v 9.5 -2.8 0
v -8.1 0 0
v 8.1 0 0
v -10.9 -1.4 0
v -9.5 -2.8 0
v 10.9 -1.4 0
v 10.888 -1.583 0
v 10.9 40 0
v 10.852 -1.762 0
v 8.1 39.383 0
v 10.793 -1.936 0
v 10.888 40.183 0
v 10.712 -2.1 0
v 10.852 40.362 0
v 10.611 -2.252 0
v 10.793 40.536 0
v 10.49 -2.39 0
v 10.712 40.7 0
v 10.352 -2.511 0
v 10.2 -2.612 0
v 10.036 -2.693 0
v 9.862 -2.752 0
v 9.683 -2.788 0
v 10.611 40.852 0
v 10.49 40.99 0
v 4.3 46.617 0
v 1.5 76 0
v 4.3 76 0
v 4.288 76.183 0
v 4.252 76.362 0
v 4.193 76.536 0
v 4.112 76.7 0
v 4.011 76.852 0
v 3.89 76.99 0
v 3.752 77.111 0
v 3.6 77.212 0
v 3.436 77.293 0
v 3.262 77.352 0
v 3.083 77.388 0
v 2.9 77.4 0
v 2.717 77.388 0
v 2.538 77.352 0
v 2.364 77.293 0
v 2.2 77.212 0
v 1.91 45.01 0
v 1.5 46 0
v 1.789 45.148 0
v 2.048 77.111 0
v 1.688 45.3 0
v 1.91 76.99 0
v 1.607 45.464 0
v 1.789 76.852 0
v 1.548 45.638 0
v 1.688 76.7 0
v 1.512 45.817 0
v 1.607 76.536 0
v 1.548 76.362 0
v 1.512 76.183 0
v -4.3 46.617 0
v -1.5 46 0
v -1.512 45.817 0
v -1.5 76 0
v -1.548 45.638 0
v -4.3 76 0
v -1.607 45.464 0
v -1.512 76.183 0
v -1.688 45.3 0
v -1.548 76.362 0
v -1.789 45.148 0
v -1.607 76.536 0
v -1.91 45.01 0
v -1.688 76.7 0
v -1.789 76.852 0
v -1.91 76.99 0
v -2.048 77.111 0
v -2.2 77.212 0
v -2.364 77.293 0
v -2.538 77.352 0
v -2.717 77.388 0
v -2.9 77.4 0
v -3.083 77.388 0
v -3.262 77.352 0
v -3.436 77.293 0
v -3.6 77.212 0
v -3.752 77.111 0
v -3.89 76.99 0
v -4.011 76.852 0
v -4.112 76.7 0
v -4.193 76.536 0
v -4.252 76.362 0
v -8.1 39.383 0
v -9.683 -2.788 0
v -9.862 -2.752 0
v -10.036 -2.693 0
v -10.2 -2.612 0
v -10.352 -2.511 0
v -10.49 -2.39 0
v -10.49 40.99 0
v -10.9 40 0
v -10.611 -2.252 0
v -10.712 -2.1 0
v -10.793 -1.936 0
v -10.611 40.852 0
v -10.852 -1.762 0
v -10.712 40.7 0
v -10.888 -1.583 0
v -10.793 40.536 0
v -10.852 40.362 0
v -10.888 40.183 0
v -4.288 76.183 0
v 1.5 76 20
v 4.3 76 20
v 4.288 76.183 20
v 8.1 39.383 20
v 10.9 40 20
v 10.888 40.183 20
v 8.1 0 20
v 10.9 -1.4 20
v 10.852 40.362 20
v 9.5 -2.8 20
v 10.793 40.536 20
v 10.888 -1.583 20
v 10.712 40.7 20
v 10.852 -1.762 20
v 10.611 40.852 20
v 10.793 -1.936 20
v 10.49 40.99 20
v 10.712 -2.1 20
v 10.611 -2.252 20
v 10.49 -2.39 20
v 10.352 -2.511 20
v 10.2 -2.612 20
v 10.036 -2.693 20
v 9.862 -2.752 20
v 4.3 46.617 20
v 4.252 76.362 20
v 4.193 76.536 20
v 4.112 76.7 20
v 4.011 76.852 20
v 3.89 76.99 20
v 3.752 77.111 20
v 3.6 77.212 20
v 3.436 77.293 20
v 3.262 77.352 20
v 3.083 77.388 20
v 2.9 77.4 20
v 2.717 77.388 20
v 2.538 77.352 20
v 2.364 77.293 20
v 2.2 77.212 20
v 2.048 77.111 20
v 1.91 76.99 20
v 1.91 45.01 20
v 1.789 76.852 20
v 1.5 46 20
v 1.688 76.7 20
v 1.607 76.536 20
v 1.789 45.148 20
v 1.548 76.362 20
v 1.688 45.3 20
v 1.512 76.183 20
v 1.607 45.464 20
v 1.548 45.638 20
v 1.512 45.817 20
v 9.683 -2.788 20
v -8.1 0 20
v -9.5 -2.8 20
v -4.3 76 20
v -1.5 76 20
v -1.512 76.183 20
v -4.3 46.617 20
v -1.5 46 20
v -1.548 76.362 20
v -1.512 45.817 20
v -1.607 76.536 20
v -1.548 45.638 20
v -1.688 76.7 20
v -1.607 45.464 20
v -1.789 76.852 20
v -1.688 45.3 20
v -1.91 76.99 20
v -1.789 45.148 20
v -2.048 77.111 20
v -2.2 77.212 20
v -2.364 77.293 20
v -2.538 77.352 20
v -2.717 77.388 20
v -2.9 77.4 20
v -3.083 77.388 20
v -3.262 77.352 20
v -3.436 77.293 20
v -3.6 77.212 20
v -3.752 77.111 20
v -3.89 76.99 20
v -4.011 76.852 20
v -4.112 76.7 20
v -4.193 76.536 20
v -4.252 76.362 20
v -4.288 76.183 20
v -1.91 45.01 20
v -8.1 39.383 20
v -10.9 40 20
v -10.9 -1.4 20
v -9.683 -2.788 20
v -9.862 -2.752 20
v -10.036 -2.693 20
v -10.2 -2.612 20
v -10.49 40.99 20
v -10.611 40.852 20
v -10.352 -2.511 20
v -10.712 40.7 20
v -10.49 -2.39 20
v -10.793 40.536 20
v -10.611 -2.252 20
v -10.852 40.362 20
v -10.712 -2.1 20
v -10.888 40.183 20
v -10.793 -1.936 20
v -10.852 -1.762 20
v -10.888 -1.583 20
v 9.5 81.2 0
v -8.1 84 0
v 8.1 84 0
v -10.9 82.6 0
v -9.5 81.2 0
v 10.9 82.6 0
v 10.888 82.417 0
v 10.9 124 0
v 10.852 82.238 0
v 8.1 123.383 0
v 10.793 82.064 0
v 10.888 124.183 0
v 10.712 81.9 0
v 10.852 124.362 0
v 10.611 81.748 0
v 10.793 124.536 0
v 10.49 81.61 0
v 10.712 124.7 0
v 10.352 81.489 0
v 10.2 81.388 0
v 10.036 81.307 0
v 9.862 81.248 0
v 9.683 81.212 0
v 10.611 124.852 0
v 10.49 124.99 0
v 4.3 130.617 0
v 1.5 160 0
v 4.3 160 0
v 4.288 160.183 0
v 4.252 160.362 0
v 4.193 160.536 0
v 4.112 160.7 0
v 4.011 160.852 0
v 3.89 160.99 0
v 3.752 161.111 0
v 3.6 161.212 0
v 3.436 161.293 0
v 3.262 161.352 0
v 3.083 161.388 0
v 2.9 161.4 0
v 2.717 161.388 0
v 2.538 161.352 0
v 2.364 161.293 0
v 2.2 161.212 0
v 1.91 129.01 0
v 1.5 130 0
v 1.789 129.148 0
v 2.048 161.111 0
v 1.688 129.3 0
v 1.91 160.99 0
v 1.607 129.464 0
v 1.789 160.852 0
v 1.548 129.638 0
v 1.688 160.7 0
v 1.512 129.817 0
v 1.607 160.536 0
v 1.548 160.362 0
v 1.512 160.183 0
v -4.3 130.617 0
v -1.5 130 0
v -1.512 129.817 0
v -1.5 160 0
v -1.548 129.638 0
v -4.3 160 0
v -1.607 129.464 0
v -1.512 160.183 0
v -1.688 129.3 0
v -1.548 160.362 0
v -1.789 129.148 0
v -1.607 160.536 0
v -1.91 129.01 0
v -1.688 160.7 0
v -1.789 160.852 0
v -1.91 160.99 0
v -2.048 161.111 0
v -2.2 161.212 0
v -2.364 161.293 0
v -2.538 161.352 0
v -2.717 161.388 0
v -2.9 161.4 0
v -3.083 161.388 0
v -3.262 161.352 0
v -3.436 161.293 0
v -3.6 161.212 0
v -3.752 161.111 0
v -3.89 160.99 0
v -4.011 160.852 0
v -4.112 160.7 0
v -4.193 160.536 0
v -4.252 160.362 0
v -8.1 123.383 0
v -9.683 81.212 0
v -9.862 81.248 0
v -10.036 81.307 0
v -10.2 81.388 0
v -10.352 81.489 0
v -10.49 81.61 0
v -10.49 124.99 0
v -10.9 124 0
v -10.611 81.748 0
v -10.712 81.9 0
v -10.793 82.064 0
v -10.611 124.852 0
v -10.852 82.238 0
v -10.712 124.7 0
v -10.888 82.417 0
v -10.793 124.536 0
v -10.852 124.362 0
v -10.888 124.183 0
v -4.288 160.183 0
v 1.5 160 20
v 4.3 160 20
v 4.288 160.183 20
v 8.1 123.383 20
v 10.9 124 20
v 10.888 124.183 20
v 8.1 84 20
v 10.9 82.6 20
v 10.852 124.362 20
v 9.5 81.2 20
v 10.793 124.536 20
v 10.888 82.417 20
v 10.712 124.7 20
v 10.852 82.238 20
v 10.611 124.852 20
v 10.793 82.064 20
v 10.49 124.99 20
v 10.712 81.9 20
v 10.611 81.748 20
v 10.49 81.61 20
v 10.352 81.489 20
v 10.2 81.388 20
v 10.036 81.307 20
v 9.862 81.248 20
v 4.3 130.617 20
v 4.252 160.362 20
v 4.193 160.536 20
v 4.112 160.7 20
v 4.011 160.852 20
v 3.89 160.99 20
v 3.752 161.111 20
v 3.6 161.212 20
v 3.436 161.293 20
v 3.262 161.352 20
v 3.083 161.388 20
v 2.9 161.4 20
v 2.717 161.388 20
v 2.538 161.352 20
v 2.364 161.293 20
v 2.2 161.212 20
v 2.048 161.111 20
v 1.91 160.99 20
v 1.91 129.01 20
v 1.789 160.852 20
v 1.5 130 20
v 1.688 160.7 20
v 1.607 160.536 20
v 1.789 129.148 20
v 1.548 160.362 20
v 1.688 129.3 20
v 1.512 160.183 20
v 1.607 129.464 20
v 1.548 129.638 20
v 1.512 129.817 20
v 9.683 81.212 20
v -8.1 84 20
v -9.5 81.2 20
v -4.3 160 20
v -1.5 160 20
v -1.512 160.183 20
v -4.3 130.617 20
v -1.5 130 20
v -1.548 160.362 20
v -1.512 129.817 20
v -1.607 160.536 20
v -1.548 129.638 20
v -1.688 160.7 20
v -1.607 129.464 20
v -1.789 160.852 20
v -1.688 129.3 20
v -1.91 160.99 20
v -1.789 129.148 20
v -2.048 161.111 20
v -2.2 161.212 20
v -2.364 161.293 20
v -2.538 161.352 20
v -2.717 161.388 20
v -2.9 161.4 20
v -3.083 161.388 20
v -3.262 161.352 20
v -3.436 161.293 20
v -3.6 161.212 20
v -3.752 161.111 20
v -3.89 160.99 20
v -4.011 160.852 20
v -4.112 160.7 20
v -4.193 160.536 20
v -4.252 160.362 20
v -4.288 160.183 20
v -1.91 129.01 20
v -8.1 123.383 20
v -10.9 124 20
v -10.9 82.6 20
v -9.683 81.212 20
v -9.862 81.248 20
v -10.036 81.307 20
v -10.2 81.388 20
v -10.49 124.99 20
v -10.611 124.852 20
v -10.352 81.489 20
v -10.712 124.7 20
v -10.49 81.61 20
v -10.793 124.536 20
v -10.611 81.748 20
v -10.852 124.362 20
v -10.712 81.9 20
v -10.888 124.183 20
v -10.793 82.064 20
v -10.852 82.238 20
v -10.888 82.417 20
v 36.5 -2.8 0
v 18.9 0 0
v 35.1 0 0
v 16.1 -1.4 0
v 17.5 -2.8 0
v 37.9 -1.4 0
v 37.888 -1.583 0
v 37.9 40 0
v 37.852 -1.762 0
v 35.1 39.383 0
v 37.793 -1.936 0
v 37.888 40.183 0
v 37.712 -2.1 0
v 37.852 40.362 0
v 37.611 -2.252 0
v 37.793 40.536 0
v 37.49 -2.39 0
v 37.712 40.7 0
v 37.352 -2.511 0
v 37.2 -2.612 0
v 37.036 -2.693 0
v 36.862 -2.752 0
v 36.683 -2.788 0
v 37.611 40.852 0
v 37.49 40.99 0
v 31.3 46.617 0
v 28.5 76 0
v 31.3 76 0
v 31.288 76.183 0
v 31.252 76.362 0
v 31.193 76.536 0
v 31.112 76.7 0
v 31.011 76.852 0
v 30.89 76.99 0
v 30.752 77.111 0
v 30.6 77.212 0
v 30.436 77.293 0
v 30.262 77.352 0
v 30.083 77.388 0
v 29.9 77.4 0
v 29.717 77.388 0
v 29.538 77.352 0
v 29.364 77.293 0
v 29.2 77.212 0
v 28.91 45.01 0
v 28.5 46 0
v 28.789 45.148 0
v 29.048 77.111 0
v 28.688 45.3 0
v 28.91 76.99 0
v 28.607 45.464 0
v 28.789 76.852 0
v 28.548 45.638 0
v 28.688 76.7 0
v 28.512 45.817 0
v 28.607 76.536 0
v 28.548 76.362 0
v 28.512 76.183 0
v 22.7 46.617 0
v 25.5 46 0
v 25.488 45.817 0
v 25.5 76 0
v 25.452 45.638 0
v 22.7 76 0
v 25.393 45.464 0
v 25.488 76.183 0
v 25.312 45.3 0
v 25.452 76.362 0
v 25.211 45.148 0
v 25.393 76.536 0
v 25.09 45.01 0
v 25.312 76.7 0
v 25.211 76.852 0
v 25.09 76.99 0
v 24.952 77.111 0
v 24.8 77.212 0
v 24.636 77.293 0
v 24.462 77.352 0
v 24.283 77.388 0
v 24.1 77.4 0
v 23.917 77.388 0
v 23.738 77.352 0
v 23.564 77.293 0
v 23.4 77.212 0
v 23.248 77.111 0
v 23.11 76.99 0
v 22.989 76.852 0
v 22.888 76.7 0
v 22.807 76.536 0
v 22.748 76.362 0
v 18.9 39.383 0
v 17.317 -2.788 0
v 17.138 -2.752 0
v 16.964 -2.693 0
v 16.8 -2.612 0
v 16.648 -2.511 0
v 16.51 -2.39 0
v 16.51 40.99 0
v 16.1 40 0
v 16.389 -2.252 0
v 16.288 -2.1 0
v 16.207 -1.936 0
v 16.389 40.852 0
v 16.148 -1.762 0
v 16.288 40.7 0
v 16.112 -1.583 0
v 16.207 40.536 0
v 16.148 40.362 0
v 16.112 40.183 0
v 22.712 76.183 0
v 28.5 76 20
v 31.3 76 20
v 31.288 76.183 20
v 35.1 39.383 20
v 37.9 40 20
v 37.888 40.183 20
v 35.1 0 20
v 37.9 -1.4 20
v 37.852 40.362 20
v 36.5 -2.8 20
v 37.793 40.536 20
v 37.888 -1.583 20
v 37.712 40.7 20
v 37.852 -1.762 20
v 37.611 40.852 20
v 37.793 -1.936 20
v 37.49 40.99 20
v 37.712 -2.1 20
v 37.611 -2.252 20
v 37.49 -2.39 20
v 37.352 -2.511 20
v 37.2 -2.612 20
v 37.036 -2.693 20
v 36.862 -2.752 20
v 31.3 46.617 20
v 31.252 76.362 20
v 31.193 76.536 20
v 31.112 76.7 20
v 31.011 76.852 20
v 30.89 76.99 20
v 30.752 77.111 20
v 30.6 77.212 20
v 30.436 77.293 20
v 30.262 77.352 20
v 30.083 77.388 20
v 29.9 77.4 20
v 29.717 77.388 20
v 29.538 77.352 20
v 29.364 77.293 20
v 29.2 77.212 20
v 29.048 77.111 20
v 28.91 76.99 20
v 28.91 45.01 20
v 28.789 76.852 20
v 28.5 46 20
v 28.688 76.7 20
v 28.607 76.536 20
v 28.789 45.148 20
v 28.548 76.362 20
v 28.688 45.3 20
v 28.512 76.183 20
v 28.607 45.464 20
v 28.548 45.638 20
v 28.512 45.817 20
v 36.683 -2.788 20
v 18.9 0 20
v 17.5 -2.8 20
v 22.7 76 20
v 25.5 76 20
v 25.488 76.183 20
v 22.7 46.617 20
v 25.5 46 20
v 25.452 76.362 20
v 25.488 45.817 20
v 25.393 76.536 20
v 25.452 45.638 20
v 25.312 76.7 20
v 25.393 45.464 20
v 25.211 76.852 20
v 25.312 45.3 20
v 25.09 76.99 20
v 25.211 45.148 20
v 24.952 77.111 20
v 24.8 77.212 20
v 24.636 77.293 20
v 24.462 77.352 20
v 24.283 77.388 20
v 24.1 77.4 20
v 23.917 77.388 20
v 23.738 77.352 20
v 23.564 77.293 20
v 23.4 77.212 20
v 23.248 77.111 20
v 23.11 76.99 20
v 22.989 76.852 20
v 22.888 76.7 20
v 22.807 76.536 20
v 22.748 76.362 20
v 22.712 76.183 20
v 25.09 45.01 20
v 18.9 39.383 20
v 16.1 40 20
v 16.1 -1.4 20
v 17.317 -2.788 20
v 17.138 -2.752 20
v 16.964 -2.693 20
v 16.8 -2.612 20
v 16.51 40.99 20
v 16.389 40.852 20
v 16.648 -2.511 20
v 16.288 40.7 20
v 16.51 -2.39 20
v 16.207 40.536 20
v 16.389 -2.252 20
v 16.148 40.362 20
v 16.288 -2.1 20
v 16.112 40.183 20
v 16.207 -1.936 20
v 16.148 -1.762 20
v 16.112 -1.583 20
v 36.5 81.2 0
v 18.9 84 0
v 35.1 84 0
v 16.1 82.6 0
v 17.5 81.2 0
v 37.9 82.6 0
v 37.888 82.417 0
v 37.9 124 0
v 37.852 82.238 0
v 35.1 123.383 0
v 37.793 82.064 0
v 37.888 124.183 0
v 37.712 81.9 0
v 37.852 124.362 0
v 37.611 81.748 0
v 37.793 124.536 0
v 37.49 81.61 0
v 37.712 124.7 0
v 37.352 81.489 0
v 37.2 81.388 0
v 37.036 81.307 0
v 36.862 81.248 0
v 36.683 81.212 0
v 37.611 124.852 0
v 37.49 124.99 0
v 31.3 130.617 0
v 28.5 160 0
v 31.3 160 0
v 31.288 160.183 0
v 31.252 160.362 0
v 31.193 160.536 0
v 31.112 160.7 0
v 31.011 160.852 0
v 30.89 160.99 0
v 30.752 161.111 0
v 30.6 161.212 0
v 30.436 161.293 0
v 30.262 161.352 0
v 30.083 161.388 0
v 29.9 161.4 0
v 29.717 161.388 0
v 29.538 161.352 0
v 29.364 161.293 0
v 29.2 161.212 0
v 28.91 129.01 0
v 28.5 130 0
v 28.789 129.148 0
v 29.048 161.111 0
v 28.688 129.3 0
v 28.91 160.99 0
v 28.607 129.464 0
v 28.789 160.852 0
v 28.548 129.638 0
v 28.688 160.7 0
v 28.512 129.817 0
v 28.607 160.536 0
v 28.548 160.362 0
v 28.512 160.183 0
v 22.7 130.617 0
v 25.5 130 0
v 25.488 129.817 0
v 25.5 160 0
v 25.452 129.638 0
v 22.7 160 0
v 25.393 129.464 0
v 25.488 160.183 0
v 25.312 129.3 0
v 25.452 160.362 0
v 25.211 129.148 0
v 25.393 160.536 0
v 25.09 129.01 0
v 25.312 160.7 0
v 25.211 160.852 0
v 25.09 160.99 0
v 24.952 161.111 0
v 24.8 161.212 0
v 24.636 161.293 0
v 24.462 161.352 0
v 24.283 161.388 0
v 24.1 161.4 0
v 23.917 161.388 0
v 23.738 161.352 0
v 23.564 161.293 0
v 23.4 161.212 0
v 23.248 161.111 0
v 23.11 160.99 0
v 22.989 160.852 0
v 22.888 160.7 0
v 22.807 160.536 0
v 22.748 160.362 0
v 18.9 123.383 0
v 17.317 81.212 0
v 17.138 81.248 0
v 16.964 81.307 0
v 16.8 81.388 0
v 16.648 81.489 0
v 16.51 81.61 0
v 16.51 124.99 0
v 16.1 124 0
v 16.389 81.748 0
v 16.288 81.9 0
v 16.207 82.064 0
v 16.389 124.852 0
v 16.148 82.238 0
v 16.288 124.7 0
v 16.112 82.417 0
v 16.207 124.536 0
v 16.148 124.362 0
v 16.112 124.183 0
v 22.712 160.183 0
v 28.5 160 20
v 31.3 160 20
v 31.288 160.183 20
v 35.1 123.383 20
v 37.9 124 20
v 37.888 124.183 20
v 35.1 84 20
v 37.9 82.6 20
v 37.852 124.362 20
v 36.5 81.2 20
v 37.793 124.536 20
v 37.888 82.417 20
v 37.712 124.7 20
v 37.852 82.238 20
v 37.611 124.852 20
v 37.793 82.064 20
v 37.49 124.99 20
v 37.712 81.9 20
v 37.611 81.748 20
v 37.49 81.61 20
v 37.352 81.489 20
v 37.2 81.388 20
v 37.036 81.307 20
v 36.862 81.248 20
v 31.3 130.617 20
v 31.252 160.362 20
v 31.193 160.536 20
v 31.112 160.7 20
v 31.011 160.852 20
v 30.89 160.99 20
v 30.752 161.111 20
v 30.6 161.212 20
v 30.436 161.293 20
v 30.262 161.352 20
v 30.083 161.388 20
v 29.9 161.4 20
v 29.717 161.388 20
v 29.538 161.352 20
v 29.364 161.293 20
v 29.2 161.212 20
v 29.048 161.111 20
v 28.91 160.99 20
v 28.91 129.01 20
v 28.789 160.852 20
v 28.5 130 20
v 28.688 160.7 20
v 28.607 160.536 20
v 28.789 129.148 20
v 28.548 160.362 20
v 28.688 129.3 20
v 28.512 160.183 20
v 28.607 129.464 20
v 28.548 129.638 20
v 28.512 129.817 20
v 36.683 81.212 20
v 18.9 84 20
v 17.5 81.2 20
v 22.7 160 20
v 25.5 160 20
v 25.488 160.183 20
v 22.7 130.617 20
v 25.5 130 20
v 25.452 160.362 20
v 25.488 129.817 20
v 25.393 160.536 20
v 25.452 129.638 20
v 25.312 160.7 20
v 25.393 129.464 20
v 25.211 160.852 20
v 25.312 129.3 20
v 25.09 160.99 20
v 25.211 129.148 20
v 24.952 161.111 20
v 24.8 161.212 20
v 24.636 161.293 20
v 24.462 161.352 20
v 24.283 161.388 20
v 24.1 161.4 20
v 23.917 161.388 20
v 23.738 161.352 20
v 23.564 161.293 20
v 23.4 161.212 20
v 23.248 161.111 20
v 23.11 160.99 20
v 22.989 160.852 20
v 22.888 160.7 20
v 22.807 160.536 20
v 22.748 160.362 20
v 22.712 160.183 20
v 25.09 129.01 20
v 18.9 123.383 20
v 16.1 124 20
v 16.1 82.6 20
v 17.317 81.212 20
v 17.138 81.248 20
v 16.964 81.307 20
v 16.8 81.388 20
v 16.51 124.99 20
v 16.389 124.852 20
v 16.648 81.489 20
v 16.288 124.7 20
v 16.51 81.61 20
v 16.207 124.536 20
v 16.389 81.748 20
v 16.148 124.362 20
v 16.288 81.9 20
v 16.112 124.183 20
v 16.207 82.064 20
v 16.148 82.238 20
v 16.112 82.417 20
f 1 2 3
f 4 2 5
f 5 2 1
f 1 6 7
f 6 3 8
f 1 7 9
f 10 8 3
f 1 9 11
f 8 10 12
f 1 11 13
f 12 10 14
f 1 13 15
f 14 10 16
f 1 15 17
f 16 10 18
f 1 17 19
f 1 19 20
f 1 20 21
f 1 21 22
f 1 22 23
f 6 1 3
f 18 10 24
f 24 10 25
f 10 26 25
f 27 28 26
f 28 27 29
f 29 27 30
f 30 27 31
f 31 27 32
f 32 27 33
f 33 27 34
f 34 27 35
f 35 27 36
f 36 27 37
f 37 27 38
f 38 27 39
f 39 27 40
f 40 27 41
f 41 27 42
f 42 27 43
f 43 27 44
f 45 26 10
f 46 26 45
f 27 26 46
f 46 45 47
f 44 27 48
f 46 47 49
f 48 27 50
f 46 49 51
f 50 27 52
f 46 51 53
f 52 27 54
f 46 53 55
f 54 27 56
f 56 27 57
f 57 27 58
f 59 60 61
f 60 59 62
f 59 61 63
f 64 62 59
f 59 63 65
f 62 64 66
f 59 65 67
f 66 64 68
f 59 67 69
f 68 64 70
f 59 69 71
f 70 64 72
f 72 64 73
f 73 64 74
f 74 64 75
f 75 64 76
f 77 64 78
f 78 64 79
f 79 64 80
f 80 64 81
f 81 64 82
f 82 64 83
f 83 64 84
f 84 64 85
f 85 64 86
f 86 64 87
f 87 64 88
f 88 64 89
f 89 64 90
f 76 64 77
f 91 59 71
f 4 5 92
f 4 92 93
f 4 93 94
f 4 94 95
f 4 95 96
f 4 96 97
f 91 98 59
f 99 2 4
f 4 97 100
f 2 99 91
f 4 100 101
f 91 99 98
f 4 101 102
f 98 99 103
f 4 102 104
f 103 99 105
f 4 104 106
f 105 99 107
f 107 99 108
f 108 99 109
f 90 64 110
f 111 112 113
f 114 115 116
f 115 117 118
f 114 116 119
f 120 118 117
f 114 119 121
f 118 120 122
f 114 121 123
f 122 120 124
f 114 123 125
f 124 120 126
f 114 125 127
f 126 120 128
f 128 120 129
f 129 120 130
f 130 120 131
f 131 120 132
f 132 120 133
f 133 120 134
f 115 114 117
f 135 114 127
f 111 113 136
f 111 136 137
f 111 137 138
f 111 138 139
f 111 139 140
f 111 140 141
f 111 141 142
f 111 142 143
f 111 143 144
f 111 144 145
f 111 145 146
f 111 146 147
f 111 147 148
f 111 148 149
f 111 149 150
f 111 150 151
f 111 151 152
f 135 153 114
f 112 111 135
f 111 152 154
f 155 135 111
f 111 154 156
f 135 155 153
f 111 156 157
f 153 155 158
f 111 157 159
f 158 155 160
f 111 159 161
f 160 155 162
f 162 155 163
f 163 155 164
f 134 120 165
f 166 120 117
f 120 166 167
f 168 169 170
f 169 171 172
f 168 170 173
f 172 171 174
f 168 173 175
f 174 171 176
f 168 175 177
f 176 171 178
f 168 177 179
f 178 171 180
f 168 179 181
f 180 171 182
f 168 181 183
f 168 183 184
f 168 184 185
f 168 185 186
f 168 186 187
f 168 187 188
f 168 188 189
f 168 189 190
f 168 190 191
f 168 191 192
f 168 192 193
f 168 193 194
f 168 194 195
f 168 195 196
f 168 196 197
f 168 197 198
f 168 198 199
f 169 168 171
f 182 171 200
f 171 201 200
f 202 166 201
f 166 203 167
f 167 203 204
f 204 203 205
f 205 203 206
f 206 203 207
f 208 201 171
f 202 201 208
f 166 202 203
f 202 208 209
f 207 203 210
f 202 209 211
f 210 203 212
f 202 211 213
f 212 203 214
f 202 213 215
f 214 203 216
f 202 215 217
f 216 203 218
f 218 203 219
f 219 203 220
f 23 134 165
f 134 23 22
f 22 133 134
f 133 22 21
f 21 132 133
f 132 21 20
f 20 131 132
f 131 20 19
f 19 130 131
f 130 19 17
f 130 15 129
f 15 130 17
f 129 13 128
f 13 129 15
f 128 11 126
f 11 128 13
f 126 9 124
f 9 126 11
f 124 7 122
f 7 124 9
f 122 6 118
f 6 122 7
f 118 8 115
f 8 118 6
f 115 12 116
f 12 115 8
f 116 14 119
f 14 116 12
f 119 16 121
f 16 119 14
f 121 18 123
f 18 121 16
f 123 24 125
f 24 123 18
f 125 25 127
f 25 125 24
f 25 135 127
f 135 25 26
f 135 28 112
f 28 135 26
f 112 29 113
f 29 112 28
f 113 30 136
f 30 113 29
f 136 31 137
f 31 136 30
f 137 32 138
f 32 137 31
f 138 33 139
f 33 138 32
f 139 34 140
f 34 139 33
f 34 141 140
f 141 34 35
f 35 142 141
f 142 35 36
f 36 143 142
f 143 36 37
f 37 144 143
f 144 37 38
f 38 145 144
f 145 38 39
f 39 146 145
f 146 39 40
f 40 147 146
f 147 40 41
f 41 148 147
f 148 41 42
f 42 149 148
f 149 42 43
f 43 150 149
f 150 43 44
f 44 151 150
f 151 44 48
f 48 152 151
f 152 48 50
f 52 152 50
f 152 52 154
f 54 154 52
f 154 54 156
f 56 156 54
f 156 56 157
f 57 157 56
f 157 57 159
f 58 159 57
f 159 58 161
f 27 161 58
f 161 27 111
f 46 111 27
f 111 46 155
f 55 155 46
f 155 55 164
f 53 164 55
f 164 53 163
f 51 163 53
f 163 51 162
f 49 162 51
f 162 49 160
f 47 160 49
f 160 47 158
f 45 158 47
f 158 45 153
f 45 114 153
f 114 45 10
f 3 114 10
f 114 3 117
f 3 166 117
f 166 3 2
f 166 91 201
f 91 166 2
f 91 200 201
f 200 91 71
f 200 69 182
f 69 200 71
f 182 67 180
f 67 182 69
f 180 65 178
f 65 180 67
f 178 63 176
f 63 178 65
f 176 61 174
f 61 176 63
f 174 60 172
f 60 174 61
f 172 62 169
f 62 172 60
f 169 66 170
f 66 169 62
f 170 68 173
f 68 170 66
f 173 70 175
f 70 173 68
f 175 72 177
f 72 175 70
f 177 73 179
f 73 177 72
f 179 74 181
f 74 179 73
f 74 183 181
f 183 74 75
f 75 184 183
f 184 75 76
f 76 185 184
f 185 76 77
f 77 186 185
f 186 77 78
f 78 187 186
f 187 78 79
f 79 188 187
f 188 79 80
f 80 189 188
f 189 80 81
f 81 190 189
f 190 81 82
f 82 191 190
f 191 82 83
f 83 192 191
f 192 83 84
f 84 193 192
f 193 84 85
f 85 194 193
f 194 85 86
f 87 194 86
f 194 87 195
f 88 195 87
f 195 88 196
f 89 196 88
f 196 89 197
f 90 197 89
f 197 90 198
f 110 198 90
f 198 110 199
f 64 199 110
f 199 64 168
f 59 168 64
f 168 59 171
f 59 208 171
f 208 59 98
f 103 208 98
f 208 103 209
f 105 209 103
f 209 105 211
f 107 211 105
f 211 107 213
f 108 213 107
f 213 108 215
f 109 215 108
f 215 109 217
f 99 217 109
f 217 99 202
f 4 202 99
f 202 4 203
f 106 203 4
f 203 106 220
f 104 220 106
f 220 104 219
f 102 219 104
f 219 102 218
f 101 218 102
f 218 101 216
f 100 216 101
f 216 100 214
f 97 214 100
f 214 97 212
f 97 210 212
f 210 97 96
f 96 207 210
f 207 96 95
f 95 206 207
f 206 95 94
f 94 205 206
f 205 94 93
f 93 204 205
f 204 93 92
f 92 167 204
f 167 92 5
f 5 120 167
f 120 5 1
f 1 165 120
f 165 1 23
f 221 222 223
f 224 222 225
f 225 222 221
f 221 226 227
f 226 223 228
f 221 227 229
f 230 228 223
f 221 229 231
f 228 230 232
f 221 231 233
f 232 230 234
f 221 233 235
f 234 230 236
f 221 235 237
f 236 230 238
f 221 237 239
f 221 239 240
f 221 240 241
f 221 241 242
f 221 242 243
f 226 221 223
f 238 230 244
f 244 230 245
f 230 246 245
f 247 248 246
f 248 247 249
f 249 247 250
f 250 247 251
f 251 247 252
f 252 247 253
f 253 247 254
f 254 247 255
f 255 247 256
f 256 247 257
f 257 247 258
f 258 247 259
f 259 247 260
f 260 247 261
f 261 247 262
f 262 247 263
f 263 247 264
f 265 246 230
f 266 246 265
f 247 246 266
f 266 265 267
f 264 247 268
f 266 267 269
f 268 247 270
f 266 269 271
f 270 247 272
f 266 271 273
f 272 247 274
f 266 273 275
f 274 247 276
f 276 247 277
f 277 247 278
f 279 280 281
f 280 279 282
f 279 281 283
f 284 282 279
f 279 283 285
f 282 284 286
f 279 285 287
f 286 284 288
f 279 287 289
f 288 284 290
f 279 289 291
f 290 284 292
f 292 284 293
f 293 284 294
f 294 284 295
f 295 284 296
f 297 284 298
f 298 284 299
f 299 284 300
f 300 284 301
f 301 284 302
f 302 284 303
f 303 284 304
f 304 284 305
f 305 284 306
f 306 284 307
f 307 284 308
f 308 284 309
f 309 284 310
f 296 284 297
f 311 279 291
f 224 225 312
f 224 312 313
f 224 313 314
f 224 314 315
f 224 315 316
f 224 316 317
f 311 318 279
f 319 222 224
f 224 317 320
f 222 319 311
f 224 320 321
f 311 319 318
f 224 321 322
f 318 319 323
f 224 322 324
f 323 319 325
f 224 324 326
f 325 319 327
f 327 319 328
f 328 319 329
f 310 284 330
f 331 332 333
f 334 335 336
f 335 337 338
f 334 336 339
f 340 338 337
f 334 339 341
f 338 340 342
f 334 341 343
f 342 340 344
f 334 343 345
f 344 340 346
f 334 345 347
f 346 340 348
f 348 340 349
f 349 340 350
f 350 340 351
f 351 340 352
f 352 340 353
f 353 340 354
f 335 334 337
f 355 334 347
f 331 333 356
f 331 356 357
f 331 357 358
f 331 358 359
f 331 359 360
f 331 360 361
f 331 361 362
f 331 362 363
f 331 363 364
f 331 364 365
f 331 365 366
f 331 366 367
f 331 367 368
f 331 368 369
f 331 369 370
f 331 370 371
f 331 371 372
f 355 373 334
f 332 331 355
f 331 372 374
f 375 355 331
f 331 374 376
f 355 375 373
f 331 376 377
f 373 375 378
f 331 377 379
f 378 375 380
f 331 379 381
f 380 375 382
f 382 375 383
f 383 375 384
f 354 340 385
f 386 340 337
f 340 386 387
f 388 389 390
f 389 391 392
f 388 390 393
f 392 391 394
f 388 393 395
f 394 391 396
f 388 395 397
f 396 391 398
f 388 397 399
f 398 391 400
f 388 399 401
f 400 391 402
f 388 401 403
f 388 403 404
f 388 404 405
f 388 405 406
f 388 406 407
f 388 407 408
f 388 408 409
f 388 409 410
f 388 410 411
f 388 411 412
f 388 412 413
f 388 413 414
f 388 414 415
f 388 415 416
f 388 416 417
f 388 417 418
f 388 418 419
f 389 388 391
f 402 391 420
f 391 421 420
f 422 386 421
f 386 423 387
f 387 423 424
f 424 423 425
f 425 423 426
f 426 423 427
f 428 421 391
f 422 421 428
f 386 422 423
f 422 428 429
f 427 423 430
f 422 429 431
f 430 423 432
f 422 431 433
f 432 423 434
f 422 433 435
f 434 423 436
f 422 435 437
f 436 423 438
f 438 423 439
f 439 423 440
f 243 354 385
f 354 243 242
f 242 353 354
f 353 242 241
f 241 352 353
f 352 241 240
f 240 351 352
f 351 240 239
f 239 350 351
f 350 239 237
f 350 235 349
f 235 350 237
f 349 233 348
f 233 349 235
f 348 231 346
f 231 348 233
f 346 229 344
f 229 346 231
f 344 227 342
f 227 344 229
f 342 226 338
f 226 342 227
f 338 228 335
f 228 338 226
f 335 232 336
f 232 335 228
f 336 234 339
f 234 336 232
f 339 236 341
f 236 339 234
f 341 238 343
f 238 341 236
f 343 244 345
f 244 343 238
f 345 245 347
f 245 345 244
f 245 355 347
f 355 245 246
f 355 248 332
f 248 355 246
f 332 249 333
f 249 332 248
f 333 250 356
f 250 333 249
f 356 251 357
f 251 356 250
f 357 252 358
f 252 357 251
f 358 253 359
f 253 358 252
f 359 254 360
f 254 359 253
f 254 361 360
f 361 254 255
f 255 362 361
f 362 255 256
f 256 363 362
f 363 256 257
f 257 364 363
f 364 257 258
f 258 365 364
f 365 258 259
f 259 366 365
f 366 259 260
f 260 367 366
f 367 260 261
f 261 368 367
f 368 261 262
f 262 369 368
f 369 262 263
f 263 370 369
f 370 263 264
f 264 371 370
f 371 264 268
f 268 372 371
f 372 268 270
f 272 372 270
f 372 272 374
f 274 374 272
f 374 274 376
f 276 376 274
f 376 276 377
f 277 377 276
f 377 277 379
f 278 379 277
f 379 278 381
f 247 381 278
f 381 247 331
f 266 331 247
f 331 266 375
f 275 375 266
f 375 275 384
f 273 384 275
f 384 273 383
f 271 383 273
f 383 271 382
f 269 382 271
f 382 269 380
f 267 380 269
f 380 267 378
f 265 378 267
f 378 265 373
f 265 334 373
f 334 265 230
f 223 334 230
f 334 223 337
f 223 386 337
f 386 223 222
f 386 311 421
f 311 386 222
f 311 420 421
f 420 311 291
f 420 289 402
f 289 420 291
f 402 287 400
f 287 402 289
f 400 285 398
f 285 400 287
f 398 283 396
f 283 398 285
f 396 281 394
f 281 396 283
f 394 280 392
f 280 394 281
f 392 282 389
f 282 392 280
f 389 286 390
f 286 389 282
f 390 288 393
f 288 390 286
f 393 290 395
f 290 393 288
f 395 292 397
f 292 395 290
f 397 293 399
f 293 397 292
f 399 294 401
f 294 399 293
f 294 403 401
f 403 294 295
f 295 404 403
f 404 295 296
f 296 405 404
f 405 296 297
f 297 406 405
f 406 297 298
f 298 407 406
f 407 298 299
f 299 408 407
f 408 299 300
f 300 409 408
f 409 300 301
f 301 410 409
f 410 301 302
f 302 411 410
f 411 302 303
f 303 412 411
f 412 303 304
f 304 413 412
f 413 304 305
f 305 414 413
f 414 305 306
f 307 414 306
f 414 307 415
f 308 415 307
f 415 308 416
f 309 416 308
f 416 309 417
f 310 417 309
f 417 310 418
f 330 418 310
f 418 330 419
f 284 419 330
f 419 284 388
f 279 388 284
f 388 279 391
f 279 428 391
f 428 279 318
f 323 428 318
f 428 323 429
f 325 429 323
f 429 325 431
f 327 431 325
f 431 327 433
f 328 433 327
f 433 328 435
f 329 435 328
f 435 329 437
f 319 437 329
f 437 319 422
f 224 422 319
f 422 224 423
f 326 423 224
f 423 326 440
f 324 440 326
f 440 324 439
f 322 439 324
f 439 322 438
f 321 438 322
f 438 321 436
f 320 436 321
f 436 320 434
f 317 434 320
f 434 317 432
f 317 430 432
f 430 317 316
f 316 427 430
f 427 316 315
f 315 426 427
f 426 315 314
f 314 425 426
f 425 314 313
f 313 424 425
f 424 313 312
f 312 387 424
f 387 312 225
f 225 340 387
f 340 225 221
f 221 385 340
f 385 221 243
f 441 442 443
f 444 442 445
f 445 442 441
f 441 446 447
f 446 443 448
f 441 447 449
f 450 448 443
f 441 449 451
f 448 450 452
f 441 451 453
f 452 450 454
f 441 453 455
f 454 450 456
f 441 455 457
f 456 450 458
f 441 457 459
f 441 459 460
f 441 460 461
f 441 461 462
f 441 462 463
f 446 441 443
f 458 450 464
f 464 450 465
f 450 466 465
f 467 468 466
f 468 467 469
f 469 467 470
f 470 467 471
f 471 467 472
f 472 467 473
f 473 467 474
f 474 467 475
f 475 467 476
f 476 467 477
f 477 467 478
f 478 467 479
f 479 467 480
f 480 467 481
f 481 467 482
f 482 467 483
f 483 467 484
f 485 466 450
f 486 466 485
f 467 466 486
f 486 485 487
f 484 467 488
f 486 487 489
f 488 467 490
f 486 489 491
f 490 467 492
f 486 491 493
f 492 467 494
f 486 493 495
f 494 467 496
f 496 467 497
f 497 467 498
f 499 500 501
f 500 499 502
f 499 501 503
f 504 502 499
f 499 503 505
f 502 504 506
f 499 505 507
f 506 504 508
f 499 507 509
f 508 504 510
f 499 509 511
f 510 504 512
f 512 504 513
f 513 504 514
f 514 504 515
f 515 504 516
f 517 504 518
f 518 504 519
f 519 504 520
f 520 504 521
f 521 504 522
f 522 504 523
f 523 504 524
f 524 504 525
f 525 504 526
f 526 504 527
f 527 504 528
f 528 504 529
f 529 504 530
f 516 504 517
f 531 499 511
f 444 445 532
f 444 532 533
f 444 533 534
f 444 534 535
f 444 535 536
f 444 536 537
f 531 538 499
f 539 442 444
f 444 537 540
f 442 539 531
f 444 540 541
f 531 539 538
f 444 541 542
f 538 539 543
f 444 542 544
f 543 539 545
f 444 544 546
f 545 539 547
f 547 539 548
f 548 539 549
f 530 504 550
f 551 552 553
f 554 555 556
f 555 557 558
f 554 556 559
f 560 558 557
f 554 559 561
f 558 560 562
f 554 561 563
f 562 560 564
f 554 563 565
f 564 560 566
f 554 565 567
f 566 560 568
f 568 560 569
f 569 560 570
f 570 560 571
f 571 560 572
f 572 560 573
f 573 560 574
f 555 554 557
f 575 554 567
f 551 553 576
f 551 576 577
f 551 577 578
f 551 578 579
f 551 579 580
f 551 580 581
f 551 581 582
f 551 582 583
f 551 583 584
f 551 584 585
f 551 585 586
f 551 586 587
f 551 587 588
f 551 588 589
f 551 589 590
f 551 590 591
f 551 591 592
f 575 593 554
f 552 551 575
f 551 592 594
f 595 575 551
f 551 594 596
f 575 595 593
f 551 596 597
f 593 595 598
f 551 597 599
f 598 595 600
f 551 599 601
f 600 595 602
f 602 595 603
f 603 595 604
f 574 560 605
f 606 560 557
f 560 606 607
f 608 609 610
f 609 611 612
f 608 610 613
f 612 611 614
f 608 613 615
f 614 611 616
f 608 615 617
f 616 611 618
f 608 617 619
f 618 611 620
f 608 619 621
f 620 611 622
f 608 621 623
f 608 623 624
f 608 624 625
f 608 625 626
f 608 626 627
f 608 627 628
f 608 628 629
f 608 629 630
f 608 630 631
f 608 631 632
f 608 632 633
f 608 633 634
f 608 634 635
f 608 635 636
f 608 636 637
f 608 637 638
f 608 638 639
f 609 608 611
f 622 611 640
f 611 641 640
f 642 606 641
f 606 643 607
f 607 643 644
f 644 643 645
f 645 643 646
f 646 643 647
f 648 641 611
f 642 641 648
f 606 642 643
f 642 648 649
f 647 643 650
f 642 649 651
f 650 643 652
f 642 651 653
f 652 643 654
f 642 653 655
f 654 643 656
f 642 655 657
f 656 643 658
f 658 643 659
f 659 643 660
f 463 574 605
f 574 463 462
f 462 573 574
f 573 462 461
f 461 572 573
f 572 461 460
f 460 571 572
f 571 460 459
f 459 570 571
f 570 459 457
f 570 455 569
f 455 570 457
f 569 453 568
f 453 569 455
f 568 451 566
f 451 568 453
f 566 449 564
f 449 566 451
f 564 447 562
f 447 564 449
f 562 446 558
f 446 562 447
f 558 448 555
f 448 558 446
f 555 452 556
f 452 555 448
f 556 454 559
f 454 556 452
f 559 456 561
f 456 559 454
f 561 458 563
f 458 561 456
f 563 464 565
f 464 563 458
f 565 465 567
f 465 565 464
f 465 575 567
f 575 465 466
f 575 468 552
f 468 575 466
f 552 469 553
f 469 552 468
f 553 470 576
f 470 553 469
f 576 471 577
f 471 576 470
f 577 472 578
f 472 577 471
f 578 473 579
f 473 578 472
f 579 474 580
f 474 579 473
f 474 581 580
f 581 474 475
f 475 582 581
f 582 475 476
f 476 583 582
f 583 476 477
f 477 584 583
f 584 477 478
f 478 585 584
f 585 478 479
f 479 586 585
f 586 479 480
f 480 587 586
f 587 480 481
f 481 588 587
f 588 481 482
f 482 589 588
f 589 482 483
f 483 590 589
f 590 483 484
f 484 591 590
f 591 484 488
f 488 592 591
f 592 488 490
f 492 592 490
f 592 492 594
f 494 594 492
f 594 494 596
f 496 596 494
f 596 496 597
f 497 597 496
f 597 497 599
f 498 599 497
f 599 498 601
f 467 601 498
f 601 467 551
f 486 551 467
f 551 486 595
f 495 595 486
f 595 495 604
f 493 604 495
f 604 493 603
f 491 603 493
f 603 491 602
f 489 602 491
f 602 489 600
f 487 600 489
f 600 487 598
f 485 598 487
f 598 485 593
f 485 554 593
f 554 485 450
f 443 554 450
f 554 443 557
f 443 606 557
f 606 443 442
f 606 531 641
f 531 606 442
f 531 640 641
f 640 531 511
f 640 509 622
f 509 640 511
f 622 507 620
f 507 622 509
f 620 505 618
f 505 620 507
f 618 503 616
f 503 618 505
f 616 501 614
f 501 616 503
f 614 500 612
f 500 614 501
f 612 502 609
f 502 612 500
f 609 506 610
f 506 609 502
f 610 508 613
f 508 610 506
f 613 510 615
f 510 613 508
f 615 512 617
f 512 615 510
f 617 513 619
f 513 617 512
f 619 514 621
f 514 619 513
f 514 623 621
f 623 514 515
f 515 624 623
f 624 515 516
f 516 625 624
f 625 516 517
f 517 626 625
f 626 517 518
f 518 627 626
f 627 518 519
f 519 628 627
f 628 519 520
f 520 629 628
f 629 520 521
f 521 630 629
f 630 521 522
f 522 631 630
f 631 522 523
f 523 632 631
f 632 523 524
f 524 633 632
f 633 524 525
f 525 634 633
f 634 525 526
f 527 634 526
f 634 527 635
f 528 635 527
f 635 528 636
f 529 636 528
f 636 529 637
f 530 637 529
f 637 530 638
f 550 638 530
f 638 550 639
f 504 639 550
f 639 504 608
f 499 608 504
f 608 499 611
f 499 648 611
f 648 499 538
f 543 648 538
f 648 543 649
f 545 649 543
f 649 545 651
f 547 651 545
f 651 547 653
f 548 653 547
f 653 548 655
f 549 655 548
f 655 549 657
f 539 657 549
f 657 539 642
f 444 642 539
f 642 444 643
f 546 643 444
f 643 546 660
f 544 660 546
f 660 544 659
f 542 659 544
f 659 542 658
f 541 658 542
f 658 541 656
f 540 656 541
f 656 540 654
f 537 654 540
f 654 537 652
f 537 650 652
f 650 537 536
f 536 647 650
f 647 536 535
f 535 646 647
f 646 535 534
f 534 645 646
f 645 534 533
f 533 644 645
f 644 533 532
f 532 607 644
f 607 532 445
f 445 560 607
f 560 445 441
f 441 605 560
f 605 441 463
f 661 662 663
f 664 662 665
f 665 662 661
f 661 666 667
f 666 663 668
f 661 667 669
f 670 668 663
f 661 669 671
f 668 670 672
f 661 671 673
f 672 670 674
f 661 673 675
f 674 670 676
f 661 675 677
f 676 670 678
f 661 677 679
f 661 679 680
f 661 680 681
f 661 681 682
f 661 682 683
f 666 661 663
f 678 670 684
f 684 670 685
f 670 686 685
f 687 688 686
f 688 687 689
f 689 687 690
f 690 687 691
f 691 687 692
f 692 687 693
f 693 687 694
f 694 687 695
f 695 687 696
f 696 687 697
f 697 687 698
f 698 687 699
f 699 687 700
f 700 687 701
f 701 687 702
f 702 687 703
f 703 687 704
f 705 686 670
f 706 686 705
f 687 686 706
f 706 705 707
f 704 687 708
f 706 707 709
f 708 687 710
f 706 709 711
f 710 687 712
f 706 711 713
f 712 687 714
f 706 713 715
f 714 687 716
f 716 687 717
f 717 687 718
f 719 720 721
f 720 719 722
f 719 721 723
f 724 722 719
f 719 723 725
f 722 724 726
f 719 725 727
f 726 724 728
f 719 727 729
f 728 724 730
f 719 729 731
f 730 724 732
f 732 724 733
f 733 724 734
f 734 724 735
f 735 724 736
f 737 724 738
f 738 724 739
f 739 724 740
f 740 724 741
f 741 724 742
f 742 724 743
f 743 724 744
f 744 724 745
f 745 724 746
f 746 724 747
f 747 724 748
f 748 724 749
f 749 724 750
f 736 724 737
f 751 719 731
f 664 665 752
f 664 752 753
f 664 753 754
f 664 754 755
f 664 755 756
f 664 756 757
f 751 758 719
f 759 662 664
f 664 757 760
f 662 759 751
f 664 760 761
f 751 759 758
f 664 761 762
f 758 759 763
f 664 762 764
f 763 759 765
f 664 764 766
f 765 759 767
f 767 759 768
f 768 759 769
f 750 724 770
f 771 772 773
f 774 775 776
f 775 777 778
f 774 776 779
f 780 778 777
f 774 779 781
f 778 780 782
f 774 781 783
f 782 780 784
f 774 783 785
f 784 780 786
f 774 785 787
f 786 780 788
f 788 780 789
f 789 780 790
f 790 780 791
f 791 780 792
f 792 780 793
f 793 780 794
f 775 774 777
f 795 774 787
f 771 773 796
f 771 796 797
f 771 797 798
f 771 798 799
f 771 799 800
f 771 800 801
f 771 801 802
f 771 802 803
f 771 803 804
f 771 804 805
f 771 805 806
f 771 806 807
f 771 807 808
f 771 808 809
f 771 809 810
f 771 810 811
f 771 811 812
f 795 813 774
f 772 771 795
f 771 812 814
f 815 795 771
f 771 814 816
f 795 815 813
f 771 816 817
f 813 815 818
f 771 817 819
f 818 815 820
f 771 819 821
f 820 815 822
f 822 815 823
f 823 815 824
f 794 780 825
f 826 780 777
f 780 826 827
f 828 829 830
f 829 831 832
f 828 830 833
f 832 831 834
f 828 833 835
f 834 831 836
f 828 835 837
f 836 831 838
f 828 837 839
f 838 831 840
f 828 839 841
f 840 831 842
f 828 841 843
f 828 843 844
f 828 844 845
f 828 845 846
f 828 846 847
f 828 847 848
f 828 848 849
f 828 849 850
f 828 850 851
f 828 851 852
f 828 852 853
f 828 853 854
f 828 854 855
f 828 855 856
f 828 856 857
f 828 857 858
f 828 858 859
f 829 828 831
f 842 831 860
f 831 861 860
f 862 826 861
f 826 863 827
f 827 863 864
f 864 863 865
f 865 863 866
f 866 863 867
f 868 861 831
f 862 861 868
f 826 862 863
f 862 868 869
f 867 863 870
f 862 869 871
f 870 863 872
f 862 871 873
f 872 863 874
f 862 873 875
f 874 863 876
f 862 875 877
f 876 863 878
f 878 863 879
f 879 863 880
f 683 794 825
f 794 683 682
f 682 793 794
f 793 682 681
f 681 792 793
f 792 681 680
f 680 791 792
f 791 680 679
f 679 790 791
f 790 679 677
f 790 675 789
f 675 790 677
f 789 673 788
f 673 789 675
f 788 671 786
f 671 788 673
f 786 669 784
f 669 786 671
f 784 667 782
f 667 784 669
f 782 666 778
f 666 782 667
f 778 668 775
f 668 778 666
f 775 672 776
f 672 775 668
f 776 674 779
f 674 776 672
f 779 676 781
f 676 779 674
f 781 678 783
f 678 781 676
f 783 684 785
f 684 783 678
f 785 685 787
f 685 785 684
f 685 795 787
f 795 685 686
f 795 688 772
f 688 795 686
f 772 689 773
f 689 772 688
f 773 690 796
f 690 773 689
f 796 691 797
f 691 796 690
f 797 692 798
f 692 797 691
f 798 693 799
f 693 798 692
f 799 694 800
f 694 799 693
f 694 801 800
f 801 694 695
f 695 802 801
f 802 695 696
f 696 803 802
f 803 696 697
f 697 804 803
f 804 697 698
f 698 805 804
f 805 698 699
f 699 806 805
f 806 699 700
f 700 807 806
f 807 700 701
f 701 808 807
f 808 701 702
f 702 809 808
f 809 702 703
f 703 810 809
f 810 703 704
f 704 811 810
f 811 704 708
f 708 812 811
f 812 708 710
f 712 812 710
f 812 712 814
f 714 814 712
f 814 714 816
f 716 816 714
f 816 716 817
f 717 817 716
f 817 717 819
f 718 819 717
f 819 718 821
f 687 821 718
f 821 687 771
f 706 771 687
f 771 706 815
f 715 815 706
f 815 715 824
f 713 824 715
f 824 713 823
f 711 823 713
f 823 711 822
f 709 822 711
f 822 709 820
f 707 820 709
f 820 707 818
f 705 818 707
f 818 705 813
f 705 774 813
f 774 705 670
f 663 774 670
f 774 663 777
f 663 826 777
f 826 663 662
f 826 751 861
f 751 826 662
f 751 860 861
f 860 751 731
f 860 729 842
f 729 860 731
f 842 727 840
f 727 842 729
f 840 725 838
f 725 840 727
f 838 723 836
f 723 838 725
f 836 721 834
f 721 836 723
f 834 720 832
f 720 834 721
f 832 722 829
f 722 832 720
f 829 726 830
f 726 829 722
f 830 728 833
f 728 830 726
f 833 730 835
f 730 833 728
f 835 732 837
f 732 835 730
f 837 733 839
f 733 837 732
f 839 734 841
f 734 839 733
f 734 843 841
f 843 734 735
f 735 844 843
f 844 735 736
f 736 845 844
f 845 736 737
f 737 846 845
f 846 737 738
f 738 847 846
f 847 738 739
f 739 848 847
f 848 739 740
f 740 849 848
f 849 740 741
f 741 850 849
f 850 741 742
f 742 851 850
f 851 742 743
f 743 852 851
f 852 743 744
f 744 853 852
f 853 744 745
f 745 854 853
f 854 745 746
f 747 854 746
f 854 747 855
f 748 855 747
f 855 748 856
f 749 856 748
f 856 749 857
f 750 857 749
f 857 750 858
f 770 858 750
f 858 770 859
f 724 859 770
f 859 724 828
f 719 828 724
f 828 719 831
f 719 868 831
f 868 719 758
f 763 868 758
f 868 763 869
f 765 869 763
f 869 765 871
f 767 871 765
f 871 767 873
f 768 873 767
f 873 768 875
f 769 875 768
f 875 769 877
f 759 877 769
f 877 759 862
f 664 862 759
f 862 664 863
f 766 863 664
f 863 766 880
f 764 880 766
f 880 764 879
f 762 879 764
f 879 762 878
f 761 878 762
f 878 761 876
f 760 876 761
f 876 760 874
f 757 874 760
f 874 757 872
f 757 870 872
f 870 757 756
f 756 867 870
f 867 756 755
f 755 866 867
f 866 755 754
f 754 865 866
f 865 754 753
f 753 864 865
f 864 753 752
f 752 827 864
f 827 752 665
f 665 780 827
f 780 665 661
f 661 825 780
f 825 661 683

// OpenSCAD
$fn = 48;
part_id = 0; // 0 four-up plate, 1 single clip, 2 fit coupon, 3 assembly, 4 profile

frame_depth = 15.5;
frame_gap = 16.2;
frame_face_width = 40;
taper_length = 6;
canvas_reach = 30;
narrow_gap = 3.0;

clip_width = 20;
clip_thickness = 2.8;

coupon_gaps = [3.0, 3.5, 4.0];
coupon_arm_length = 16;
coupon_reach = 12;
coupon_taper = 4;
coupon_width = 8;

eps = 0.05;

module capsule_2d(start, end, diameter) {
    hull() {
        translate(start) circle(d=diameter);
        translate(end) circle(d=diameter);
    }
}

module clip_profile_2d(
    gap=frame_gap,
    frame_width=frame_face_width,
    transition=taper_length,
    reach=canvas_reach,
    end_gap=narrow_gap
) {
    radius = clip_thickness / 2;
    wide_x = gap / 2 + radius;
    narrow_x = end_gap / 2 + radius;
    bridge_y = -radius;
    taper_end = frame_width + transition;
    reach_end = taper_end + reach;

    union() {
        capsule_2d([-wide_x, bridge_y], [wide_x, bridge_y], clip_thickness);
        for (side = [-1, 1]) {
            capsule_2d(
                [side * wide_x, bridge_y],
                [side * wide_x, frame_width],
                clip_thickness
            );
            capsule_2d(
                [side * wide_x, frame_width],
                [side * narrow_x, taper_end],
                clip_thickness
            );
            capsule_2d(
                [side * narrow_x, taper_end],
                [side * narrow_x, reach_end],
                clip_thickness
            );
        }
    }
}

module canvas_clip(gap=frame_gap, width=clip_width) {
    linear_extrude(width)
        clip_profile_2d(gap=gap);
}

module fit_coupon(end_gap, marker_count) {
    difference() {
        linear_extrude(coupon_width)
            clip_profile_2d(
                gap=frame_gap,
                frame_width=coupon_arm_length,
                transition=coupon_taper,
                reach=coupon_reach,
                end_gap=end_gap
            );

        for (marker = [0 : marker_count - 1])
            translate([
                (marker - (marker_count - 1) / 2) * 2.4,
                -clip_thickness / 2,
                -eps
            ])
                cylinder(d=0.9, h=coupon_width + 2 * eps, $fn=18);
    }
}

module coupon_plate() {
    for (index = [0 : len(coupon_gaps) - 1])
        translate([index * 28, 0, 0])
            fit_coupon(coupon_gaps[index], index + 1);
}

module four_clip_plate() {
    for (column = [0 : 1])
        for (row = [0 : 1])
            translate([column * 27, row * 84, 0])
                canvas_clip();
}

module assembly_view() {
    color("burlywood")
        translate([-frame_depth / 2, 0, 2])
            cube([frame_depth, frame_face_width, clip_width - 4]);
    color("linen")
        translate([-narrow_gap / 2, frame_face_width + taper_length, 2])
            cube([narrow_gap, canvas_reach + 4, clip_width - 4]);
    color("orange") canvas_clip();
}

if (part_id == 1) {
    canvas_clip();
} else if (part_id == 2) {
    coupon_plate();
} else if (part_id == 3) {
    assembly_view();
} else if (part_id == 4) {
    linear_extrude(1) clip_profile_2d();
} else {
    four_clip_plate();
}
